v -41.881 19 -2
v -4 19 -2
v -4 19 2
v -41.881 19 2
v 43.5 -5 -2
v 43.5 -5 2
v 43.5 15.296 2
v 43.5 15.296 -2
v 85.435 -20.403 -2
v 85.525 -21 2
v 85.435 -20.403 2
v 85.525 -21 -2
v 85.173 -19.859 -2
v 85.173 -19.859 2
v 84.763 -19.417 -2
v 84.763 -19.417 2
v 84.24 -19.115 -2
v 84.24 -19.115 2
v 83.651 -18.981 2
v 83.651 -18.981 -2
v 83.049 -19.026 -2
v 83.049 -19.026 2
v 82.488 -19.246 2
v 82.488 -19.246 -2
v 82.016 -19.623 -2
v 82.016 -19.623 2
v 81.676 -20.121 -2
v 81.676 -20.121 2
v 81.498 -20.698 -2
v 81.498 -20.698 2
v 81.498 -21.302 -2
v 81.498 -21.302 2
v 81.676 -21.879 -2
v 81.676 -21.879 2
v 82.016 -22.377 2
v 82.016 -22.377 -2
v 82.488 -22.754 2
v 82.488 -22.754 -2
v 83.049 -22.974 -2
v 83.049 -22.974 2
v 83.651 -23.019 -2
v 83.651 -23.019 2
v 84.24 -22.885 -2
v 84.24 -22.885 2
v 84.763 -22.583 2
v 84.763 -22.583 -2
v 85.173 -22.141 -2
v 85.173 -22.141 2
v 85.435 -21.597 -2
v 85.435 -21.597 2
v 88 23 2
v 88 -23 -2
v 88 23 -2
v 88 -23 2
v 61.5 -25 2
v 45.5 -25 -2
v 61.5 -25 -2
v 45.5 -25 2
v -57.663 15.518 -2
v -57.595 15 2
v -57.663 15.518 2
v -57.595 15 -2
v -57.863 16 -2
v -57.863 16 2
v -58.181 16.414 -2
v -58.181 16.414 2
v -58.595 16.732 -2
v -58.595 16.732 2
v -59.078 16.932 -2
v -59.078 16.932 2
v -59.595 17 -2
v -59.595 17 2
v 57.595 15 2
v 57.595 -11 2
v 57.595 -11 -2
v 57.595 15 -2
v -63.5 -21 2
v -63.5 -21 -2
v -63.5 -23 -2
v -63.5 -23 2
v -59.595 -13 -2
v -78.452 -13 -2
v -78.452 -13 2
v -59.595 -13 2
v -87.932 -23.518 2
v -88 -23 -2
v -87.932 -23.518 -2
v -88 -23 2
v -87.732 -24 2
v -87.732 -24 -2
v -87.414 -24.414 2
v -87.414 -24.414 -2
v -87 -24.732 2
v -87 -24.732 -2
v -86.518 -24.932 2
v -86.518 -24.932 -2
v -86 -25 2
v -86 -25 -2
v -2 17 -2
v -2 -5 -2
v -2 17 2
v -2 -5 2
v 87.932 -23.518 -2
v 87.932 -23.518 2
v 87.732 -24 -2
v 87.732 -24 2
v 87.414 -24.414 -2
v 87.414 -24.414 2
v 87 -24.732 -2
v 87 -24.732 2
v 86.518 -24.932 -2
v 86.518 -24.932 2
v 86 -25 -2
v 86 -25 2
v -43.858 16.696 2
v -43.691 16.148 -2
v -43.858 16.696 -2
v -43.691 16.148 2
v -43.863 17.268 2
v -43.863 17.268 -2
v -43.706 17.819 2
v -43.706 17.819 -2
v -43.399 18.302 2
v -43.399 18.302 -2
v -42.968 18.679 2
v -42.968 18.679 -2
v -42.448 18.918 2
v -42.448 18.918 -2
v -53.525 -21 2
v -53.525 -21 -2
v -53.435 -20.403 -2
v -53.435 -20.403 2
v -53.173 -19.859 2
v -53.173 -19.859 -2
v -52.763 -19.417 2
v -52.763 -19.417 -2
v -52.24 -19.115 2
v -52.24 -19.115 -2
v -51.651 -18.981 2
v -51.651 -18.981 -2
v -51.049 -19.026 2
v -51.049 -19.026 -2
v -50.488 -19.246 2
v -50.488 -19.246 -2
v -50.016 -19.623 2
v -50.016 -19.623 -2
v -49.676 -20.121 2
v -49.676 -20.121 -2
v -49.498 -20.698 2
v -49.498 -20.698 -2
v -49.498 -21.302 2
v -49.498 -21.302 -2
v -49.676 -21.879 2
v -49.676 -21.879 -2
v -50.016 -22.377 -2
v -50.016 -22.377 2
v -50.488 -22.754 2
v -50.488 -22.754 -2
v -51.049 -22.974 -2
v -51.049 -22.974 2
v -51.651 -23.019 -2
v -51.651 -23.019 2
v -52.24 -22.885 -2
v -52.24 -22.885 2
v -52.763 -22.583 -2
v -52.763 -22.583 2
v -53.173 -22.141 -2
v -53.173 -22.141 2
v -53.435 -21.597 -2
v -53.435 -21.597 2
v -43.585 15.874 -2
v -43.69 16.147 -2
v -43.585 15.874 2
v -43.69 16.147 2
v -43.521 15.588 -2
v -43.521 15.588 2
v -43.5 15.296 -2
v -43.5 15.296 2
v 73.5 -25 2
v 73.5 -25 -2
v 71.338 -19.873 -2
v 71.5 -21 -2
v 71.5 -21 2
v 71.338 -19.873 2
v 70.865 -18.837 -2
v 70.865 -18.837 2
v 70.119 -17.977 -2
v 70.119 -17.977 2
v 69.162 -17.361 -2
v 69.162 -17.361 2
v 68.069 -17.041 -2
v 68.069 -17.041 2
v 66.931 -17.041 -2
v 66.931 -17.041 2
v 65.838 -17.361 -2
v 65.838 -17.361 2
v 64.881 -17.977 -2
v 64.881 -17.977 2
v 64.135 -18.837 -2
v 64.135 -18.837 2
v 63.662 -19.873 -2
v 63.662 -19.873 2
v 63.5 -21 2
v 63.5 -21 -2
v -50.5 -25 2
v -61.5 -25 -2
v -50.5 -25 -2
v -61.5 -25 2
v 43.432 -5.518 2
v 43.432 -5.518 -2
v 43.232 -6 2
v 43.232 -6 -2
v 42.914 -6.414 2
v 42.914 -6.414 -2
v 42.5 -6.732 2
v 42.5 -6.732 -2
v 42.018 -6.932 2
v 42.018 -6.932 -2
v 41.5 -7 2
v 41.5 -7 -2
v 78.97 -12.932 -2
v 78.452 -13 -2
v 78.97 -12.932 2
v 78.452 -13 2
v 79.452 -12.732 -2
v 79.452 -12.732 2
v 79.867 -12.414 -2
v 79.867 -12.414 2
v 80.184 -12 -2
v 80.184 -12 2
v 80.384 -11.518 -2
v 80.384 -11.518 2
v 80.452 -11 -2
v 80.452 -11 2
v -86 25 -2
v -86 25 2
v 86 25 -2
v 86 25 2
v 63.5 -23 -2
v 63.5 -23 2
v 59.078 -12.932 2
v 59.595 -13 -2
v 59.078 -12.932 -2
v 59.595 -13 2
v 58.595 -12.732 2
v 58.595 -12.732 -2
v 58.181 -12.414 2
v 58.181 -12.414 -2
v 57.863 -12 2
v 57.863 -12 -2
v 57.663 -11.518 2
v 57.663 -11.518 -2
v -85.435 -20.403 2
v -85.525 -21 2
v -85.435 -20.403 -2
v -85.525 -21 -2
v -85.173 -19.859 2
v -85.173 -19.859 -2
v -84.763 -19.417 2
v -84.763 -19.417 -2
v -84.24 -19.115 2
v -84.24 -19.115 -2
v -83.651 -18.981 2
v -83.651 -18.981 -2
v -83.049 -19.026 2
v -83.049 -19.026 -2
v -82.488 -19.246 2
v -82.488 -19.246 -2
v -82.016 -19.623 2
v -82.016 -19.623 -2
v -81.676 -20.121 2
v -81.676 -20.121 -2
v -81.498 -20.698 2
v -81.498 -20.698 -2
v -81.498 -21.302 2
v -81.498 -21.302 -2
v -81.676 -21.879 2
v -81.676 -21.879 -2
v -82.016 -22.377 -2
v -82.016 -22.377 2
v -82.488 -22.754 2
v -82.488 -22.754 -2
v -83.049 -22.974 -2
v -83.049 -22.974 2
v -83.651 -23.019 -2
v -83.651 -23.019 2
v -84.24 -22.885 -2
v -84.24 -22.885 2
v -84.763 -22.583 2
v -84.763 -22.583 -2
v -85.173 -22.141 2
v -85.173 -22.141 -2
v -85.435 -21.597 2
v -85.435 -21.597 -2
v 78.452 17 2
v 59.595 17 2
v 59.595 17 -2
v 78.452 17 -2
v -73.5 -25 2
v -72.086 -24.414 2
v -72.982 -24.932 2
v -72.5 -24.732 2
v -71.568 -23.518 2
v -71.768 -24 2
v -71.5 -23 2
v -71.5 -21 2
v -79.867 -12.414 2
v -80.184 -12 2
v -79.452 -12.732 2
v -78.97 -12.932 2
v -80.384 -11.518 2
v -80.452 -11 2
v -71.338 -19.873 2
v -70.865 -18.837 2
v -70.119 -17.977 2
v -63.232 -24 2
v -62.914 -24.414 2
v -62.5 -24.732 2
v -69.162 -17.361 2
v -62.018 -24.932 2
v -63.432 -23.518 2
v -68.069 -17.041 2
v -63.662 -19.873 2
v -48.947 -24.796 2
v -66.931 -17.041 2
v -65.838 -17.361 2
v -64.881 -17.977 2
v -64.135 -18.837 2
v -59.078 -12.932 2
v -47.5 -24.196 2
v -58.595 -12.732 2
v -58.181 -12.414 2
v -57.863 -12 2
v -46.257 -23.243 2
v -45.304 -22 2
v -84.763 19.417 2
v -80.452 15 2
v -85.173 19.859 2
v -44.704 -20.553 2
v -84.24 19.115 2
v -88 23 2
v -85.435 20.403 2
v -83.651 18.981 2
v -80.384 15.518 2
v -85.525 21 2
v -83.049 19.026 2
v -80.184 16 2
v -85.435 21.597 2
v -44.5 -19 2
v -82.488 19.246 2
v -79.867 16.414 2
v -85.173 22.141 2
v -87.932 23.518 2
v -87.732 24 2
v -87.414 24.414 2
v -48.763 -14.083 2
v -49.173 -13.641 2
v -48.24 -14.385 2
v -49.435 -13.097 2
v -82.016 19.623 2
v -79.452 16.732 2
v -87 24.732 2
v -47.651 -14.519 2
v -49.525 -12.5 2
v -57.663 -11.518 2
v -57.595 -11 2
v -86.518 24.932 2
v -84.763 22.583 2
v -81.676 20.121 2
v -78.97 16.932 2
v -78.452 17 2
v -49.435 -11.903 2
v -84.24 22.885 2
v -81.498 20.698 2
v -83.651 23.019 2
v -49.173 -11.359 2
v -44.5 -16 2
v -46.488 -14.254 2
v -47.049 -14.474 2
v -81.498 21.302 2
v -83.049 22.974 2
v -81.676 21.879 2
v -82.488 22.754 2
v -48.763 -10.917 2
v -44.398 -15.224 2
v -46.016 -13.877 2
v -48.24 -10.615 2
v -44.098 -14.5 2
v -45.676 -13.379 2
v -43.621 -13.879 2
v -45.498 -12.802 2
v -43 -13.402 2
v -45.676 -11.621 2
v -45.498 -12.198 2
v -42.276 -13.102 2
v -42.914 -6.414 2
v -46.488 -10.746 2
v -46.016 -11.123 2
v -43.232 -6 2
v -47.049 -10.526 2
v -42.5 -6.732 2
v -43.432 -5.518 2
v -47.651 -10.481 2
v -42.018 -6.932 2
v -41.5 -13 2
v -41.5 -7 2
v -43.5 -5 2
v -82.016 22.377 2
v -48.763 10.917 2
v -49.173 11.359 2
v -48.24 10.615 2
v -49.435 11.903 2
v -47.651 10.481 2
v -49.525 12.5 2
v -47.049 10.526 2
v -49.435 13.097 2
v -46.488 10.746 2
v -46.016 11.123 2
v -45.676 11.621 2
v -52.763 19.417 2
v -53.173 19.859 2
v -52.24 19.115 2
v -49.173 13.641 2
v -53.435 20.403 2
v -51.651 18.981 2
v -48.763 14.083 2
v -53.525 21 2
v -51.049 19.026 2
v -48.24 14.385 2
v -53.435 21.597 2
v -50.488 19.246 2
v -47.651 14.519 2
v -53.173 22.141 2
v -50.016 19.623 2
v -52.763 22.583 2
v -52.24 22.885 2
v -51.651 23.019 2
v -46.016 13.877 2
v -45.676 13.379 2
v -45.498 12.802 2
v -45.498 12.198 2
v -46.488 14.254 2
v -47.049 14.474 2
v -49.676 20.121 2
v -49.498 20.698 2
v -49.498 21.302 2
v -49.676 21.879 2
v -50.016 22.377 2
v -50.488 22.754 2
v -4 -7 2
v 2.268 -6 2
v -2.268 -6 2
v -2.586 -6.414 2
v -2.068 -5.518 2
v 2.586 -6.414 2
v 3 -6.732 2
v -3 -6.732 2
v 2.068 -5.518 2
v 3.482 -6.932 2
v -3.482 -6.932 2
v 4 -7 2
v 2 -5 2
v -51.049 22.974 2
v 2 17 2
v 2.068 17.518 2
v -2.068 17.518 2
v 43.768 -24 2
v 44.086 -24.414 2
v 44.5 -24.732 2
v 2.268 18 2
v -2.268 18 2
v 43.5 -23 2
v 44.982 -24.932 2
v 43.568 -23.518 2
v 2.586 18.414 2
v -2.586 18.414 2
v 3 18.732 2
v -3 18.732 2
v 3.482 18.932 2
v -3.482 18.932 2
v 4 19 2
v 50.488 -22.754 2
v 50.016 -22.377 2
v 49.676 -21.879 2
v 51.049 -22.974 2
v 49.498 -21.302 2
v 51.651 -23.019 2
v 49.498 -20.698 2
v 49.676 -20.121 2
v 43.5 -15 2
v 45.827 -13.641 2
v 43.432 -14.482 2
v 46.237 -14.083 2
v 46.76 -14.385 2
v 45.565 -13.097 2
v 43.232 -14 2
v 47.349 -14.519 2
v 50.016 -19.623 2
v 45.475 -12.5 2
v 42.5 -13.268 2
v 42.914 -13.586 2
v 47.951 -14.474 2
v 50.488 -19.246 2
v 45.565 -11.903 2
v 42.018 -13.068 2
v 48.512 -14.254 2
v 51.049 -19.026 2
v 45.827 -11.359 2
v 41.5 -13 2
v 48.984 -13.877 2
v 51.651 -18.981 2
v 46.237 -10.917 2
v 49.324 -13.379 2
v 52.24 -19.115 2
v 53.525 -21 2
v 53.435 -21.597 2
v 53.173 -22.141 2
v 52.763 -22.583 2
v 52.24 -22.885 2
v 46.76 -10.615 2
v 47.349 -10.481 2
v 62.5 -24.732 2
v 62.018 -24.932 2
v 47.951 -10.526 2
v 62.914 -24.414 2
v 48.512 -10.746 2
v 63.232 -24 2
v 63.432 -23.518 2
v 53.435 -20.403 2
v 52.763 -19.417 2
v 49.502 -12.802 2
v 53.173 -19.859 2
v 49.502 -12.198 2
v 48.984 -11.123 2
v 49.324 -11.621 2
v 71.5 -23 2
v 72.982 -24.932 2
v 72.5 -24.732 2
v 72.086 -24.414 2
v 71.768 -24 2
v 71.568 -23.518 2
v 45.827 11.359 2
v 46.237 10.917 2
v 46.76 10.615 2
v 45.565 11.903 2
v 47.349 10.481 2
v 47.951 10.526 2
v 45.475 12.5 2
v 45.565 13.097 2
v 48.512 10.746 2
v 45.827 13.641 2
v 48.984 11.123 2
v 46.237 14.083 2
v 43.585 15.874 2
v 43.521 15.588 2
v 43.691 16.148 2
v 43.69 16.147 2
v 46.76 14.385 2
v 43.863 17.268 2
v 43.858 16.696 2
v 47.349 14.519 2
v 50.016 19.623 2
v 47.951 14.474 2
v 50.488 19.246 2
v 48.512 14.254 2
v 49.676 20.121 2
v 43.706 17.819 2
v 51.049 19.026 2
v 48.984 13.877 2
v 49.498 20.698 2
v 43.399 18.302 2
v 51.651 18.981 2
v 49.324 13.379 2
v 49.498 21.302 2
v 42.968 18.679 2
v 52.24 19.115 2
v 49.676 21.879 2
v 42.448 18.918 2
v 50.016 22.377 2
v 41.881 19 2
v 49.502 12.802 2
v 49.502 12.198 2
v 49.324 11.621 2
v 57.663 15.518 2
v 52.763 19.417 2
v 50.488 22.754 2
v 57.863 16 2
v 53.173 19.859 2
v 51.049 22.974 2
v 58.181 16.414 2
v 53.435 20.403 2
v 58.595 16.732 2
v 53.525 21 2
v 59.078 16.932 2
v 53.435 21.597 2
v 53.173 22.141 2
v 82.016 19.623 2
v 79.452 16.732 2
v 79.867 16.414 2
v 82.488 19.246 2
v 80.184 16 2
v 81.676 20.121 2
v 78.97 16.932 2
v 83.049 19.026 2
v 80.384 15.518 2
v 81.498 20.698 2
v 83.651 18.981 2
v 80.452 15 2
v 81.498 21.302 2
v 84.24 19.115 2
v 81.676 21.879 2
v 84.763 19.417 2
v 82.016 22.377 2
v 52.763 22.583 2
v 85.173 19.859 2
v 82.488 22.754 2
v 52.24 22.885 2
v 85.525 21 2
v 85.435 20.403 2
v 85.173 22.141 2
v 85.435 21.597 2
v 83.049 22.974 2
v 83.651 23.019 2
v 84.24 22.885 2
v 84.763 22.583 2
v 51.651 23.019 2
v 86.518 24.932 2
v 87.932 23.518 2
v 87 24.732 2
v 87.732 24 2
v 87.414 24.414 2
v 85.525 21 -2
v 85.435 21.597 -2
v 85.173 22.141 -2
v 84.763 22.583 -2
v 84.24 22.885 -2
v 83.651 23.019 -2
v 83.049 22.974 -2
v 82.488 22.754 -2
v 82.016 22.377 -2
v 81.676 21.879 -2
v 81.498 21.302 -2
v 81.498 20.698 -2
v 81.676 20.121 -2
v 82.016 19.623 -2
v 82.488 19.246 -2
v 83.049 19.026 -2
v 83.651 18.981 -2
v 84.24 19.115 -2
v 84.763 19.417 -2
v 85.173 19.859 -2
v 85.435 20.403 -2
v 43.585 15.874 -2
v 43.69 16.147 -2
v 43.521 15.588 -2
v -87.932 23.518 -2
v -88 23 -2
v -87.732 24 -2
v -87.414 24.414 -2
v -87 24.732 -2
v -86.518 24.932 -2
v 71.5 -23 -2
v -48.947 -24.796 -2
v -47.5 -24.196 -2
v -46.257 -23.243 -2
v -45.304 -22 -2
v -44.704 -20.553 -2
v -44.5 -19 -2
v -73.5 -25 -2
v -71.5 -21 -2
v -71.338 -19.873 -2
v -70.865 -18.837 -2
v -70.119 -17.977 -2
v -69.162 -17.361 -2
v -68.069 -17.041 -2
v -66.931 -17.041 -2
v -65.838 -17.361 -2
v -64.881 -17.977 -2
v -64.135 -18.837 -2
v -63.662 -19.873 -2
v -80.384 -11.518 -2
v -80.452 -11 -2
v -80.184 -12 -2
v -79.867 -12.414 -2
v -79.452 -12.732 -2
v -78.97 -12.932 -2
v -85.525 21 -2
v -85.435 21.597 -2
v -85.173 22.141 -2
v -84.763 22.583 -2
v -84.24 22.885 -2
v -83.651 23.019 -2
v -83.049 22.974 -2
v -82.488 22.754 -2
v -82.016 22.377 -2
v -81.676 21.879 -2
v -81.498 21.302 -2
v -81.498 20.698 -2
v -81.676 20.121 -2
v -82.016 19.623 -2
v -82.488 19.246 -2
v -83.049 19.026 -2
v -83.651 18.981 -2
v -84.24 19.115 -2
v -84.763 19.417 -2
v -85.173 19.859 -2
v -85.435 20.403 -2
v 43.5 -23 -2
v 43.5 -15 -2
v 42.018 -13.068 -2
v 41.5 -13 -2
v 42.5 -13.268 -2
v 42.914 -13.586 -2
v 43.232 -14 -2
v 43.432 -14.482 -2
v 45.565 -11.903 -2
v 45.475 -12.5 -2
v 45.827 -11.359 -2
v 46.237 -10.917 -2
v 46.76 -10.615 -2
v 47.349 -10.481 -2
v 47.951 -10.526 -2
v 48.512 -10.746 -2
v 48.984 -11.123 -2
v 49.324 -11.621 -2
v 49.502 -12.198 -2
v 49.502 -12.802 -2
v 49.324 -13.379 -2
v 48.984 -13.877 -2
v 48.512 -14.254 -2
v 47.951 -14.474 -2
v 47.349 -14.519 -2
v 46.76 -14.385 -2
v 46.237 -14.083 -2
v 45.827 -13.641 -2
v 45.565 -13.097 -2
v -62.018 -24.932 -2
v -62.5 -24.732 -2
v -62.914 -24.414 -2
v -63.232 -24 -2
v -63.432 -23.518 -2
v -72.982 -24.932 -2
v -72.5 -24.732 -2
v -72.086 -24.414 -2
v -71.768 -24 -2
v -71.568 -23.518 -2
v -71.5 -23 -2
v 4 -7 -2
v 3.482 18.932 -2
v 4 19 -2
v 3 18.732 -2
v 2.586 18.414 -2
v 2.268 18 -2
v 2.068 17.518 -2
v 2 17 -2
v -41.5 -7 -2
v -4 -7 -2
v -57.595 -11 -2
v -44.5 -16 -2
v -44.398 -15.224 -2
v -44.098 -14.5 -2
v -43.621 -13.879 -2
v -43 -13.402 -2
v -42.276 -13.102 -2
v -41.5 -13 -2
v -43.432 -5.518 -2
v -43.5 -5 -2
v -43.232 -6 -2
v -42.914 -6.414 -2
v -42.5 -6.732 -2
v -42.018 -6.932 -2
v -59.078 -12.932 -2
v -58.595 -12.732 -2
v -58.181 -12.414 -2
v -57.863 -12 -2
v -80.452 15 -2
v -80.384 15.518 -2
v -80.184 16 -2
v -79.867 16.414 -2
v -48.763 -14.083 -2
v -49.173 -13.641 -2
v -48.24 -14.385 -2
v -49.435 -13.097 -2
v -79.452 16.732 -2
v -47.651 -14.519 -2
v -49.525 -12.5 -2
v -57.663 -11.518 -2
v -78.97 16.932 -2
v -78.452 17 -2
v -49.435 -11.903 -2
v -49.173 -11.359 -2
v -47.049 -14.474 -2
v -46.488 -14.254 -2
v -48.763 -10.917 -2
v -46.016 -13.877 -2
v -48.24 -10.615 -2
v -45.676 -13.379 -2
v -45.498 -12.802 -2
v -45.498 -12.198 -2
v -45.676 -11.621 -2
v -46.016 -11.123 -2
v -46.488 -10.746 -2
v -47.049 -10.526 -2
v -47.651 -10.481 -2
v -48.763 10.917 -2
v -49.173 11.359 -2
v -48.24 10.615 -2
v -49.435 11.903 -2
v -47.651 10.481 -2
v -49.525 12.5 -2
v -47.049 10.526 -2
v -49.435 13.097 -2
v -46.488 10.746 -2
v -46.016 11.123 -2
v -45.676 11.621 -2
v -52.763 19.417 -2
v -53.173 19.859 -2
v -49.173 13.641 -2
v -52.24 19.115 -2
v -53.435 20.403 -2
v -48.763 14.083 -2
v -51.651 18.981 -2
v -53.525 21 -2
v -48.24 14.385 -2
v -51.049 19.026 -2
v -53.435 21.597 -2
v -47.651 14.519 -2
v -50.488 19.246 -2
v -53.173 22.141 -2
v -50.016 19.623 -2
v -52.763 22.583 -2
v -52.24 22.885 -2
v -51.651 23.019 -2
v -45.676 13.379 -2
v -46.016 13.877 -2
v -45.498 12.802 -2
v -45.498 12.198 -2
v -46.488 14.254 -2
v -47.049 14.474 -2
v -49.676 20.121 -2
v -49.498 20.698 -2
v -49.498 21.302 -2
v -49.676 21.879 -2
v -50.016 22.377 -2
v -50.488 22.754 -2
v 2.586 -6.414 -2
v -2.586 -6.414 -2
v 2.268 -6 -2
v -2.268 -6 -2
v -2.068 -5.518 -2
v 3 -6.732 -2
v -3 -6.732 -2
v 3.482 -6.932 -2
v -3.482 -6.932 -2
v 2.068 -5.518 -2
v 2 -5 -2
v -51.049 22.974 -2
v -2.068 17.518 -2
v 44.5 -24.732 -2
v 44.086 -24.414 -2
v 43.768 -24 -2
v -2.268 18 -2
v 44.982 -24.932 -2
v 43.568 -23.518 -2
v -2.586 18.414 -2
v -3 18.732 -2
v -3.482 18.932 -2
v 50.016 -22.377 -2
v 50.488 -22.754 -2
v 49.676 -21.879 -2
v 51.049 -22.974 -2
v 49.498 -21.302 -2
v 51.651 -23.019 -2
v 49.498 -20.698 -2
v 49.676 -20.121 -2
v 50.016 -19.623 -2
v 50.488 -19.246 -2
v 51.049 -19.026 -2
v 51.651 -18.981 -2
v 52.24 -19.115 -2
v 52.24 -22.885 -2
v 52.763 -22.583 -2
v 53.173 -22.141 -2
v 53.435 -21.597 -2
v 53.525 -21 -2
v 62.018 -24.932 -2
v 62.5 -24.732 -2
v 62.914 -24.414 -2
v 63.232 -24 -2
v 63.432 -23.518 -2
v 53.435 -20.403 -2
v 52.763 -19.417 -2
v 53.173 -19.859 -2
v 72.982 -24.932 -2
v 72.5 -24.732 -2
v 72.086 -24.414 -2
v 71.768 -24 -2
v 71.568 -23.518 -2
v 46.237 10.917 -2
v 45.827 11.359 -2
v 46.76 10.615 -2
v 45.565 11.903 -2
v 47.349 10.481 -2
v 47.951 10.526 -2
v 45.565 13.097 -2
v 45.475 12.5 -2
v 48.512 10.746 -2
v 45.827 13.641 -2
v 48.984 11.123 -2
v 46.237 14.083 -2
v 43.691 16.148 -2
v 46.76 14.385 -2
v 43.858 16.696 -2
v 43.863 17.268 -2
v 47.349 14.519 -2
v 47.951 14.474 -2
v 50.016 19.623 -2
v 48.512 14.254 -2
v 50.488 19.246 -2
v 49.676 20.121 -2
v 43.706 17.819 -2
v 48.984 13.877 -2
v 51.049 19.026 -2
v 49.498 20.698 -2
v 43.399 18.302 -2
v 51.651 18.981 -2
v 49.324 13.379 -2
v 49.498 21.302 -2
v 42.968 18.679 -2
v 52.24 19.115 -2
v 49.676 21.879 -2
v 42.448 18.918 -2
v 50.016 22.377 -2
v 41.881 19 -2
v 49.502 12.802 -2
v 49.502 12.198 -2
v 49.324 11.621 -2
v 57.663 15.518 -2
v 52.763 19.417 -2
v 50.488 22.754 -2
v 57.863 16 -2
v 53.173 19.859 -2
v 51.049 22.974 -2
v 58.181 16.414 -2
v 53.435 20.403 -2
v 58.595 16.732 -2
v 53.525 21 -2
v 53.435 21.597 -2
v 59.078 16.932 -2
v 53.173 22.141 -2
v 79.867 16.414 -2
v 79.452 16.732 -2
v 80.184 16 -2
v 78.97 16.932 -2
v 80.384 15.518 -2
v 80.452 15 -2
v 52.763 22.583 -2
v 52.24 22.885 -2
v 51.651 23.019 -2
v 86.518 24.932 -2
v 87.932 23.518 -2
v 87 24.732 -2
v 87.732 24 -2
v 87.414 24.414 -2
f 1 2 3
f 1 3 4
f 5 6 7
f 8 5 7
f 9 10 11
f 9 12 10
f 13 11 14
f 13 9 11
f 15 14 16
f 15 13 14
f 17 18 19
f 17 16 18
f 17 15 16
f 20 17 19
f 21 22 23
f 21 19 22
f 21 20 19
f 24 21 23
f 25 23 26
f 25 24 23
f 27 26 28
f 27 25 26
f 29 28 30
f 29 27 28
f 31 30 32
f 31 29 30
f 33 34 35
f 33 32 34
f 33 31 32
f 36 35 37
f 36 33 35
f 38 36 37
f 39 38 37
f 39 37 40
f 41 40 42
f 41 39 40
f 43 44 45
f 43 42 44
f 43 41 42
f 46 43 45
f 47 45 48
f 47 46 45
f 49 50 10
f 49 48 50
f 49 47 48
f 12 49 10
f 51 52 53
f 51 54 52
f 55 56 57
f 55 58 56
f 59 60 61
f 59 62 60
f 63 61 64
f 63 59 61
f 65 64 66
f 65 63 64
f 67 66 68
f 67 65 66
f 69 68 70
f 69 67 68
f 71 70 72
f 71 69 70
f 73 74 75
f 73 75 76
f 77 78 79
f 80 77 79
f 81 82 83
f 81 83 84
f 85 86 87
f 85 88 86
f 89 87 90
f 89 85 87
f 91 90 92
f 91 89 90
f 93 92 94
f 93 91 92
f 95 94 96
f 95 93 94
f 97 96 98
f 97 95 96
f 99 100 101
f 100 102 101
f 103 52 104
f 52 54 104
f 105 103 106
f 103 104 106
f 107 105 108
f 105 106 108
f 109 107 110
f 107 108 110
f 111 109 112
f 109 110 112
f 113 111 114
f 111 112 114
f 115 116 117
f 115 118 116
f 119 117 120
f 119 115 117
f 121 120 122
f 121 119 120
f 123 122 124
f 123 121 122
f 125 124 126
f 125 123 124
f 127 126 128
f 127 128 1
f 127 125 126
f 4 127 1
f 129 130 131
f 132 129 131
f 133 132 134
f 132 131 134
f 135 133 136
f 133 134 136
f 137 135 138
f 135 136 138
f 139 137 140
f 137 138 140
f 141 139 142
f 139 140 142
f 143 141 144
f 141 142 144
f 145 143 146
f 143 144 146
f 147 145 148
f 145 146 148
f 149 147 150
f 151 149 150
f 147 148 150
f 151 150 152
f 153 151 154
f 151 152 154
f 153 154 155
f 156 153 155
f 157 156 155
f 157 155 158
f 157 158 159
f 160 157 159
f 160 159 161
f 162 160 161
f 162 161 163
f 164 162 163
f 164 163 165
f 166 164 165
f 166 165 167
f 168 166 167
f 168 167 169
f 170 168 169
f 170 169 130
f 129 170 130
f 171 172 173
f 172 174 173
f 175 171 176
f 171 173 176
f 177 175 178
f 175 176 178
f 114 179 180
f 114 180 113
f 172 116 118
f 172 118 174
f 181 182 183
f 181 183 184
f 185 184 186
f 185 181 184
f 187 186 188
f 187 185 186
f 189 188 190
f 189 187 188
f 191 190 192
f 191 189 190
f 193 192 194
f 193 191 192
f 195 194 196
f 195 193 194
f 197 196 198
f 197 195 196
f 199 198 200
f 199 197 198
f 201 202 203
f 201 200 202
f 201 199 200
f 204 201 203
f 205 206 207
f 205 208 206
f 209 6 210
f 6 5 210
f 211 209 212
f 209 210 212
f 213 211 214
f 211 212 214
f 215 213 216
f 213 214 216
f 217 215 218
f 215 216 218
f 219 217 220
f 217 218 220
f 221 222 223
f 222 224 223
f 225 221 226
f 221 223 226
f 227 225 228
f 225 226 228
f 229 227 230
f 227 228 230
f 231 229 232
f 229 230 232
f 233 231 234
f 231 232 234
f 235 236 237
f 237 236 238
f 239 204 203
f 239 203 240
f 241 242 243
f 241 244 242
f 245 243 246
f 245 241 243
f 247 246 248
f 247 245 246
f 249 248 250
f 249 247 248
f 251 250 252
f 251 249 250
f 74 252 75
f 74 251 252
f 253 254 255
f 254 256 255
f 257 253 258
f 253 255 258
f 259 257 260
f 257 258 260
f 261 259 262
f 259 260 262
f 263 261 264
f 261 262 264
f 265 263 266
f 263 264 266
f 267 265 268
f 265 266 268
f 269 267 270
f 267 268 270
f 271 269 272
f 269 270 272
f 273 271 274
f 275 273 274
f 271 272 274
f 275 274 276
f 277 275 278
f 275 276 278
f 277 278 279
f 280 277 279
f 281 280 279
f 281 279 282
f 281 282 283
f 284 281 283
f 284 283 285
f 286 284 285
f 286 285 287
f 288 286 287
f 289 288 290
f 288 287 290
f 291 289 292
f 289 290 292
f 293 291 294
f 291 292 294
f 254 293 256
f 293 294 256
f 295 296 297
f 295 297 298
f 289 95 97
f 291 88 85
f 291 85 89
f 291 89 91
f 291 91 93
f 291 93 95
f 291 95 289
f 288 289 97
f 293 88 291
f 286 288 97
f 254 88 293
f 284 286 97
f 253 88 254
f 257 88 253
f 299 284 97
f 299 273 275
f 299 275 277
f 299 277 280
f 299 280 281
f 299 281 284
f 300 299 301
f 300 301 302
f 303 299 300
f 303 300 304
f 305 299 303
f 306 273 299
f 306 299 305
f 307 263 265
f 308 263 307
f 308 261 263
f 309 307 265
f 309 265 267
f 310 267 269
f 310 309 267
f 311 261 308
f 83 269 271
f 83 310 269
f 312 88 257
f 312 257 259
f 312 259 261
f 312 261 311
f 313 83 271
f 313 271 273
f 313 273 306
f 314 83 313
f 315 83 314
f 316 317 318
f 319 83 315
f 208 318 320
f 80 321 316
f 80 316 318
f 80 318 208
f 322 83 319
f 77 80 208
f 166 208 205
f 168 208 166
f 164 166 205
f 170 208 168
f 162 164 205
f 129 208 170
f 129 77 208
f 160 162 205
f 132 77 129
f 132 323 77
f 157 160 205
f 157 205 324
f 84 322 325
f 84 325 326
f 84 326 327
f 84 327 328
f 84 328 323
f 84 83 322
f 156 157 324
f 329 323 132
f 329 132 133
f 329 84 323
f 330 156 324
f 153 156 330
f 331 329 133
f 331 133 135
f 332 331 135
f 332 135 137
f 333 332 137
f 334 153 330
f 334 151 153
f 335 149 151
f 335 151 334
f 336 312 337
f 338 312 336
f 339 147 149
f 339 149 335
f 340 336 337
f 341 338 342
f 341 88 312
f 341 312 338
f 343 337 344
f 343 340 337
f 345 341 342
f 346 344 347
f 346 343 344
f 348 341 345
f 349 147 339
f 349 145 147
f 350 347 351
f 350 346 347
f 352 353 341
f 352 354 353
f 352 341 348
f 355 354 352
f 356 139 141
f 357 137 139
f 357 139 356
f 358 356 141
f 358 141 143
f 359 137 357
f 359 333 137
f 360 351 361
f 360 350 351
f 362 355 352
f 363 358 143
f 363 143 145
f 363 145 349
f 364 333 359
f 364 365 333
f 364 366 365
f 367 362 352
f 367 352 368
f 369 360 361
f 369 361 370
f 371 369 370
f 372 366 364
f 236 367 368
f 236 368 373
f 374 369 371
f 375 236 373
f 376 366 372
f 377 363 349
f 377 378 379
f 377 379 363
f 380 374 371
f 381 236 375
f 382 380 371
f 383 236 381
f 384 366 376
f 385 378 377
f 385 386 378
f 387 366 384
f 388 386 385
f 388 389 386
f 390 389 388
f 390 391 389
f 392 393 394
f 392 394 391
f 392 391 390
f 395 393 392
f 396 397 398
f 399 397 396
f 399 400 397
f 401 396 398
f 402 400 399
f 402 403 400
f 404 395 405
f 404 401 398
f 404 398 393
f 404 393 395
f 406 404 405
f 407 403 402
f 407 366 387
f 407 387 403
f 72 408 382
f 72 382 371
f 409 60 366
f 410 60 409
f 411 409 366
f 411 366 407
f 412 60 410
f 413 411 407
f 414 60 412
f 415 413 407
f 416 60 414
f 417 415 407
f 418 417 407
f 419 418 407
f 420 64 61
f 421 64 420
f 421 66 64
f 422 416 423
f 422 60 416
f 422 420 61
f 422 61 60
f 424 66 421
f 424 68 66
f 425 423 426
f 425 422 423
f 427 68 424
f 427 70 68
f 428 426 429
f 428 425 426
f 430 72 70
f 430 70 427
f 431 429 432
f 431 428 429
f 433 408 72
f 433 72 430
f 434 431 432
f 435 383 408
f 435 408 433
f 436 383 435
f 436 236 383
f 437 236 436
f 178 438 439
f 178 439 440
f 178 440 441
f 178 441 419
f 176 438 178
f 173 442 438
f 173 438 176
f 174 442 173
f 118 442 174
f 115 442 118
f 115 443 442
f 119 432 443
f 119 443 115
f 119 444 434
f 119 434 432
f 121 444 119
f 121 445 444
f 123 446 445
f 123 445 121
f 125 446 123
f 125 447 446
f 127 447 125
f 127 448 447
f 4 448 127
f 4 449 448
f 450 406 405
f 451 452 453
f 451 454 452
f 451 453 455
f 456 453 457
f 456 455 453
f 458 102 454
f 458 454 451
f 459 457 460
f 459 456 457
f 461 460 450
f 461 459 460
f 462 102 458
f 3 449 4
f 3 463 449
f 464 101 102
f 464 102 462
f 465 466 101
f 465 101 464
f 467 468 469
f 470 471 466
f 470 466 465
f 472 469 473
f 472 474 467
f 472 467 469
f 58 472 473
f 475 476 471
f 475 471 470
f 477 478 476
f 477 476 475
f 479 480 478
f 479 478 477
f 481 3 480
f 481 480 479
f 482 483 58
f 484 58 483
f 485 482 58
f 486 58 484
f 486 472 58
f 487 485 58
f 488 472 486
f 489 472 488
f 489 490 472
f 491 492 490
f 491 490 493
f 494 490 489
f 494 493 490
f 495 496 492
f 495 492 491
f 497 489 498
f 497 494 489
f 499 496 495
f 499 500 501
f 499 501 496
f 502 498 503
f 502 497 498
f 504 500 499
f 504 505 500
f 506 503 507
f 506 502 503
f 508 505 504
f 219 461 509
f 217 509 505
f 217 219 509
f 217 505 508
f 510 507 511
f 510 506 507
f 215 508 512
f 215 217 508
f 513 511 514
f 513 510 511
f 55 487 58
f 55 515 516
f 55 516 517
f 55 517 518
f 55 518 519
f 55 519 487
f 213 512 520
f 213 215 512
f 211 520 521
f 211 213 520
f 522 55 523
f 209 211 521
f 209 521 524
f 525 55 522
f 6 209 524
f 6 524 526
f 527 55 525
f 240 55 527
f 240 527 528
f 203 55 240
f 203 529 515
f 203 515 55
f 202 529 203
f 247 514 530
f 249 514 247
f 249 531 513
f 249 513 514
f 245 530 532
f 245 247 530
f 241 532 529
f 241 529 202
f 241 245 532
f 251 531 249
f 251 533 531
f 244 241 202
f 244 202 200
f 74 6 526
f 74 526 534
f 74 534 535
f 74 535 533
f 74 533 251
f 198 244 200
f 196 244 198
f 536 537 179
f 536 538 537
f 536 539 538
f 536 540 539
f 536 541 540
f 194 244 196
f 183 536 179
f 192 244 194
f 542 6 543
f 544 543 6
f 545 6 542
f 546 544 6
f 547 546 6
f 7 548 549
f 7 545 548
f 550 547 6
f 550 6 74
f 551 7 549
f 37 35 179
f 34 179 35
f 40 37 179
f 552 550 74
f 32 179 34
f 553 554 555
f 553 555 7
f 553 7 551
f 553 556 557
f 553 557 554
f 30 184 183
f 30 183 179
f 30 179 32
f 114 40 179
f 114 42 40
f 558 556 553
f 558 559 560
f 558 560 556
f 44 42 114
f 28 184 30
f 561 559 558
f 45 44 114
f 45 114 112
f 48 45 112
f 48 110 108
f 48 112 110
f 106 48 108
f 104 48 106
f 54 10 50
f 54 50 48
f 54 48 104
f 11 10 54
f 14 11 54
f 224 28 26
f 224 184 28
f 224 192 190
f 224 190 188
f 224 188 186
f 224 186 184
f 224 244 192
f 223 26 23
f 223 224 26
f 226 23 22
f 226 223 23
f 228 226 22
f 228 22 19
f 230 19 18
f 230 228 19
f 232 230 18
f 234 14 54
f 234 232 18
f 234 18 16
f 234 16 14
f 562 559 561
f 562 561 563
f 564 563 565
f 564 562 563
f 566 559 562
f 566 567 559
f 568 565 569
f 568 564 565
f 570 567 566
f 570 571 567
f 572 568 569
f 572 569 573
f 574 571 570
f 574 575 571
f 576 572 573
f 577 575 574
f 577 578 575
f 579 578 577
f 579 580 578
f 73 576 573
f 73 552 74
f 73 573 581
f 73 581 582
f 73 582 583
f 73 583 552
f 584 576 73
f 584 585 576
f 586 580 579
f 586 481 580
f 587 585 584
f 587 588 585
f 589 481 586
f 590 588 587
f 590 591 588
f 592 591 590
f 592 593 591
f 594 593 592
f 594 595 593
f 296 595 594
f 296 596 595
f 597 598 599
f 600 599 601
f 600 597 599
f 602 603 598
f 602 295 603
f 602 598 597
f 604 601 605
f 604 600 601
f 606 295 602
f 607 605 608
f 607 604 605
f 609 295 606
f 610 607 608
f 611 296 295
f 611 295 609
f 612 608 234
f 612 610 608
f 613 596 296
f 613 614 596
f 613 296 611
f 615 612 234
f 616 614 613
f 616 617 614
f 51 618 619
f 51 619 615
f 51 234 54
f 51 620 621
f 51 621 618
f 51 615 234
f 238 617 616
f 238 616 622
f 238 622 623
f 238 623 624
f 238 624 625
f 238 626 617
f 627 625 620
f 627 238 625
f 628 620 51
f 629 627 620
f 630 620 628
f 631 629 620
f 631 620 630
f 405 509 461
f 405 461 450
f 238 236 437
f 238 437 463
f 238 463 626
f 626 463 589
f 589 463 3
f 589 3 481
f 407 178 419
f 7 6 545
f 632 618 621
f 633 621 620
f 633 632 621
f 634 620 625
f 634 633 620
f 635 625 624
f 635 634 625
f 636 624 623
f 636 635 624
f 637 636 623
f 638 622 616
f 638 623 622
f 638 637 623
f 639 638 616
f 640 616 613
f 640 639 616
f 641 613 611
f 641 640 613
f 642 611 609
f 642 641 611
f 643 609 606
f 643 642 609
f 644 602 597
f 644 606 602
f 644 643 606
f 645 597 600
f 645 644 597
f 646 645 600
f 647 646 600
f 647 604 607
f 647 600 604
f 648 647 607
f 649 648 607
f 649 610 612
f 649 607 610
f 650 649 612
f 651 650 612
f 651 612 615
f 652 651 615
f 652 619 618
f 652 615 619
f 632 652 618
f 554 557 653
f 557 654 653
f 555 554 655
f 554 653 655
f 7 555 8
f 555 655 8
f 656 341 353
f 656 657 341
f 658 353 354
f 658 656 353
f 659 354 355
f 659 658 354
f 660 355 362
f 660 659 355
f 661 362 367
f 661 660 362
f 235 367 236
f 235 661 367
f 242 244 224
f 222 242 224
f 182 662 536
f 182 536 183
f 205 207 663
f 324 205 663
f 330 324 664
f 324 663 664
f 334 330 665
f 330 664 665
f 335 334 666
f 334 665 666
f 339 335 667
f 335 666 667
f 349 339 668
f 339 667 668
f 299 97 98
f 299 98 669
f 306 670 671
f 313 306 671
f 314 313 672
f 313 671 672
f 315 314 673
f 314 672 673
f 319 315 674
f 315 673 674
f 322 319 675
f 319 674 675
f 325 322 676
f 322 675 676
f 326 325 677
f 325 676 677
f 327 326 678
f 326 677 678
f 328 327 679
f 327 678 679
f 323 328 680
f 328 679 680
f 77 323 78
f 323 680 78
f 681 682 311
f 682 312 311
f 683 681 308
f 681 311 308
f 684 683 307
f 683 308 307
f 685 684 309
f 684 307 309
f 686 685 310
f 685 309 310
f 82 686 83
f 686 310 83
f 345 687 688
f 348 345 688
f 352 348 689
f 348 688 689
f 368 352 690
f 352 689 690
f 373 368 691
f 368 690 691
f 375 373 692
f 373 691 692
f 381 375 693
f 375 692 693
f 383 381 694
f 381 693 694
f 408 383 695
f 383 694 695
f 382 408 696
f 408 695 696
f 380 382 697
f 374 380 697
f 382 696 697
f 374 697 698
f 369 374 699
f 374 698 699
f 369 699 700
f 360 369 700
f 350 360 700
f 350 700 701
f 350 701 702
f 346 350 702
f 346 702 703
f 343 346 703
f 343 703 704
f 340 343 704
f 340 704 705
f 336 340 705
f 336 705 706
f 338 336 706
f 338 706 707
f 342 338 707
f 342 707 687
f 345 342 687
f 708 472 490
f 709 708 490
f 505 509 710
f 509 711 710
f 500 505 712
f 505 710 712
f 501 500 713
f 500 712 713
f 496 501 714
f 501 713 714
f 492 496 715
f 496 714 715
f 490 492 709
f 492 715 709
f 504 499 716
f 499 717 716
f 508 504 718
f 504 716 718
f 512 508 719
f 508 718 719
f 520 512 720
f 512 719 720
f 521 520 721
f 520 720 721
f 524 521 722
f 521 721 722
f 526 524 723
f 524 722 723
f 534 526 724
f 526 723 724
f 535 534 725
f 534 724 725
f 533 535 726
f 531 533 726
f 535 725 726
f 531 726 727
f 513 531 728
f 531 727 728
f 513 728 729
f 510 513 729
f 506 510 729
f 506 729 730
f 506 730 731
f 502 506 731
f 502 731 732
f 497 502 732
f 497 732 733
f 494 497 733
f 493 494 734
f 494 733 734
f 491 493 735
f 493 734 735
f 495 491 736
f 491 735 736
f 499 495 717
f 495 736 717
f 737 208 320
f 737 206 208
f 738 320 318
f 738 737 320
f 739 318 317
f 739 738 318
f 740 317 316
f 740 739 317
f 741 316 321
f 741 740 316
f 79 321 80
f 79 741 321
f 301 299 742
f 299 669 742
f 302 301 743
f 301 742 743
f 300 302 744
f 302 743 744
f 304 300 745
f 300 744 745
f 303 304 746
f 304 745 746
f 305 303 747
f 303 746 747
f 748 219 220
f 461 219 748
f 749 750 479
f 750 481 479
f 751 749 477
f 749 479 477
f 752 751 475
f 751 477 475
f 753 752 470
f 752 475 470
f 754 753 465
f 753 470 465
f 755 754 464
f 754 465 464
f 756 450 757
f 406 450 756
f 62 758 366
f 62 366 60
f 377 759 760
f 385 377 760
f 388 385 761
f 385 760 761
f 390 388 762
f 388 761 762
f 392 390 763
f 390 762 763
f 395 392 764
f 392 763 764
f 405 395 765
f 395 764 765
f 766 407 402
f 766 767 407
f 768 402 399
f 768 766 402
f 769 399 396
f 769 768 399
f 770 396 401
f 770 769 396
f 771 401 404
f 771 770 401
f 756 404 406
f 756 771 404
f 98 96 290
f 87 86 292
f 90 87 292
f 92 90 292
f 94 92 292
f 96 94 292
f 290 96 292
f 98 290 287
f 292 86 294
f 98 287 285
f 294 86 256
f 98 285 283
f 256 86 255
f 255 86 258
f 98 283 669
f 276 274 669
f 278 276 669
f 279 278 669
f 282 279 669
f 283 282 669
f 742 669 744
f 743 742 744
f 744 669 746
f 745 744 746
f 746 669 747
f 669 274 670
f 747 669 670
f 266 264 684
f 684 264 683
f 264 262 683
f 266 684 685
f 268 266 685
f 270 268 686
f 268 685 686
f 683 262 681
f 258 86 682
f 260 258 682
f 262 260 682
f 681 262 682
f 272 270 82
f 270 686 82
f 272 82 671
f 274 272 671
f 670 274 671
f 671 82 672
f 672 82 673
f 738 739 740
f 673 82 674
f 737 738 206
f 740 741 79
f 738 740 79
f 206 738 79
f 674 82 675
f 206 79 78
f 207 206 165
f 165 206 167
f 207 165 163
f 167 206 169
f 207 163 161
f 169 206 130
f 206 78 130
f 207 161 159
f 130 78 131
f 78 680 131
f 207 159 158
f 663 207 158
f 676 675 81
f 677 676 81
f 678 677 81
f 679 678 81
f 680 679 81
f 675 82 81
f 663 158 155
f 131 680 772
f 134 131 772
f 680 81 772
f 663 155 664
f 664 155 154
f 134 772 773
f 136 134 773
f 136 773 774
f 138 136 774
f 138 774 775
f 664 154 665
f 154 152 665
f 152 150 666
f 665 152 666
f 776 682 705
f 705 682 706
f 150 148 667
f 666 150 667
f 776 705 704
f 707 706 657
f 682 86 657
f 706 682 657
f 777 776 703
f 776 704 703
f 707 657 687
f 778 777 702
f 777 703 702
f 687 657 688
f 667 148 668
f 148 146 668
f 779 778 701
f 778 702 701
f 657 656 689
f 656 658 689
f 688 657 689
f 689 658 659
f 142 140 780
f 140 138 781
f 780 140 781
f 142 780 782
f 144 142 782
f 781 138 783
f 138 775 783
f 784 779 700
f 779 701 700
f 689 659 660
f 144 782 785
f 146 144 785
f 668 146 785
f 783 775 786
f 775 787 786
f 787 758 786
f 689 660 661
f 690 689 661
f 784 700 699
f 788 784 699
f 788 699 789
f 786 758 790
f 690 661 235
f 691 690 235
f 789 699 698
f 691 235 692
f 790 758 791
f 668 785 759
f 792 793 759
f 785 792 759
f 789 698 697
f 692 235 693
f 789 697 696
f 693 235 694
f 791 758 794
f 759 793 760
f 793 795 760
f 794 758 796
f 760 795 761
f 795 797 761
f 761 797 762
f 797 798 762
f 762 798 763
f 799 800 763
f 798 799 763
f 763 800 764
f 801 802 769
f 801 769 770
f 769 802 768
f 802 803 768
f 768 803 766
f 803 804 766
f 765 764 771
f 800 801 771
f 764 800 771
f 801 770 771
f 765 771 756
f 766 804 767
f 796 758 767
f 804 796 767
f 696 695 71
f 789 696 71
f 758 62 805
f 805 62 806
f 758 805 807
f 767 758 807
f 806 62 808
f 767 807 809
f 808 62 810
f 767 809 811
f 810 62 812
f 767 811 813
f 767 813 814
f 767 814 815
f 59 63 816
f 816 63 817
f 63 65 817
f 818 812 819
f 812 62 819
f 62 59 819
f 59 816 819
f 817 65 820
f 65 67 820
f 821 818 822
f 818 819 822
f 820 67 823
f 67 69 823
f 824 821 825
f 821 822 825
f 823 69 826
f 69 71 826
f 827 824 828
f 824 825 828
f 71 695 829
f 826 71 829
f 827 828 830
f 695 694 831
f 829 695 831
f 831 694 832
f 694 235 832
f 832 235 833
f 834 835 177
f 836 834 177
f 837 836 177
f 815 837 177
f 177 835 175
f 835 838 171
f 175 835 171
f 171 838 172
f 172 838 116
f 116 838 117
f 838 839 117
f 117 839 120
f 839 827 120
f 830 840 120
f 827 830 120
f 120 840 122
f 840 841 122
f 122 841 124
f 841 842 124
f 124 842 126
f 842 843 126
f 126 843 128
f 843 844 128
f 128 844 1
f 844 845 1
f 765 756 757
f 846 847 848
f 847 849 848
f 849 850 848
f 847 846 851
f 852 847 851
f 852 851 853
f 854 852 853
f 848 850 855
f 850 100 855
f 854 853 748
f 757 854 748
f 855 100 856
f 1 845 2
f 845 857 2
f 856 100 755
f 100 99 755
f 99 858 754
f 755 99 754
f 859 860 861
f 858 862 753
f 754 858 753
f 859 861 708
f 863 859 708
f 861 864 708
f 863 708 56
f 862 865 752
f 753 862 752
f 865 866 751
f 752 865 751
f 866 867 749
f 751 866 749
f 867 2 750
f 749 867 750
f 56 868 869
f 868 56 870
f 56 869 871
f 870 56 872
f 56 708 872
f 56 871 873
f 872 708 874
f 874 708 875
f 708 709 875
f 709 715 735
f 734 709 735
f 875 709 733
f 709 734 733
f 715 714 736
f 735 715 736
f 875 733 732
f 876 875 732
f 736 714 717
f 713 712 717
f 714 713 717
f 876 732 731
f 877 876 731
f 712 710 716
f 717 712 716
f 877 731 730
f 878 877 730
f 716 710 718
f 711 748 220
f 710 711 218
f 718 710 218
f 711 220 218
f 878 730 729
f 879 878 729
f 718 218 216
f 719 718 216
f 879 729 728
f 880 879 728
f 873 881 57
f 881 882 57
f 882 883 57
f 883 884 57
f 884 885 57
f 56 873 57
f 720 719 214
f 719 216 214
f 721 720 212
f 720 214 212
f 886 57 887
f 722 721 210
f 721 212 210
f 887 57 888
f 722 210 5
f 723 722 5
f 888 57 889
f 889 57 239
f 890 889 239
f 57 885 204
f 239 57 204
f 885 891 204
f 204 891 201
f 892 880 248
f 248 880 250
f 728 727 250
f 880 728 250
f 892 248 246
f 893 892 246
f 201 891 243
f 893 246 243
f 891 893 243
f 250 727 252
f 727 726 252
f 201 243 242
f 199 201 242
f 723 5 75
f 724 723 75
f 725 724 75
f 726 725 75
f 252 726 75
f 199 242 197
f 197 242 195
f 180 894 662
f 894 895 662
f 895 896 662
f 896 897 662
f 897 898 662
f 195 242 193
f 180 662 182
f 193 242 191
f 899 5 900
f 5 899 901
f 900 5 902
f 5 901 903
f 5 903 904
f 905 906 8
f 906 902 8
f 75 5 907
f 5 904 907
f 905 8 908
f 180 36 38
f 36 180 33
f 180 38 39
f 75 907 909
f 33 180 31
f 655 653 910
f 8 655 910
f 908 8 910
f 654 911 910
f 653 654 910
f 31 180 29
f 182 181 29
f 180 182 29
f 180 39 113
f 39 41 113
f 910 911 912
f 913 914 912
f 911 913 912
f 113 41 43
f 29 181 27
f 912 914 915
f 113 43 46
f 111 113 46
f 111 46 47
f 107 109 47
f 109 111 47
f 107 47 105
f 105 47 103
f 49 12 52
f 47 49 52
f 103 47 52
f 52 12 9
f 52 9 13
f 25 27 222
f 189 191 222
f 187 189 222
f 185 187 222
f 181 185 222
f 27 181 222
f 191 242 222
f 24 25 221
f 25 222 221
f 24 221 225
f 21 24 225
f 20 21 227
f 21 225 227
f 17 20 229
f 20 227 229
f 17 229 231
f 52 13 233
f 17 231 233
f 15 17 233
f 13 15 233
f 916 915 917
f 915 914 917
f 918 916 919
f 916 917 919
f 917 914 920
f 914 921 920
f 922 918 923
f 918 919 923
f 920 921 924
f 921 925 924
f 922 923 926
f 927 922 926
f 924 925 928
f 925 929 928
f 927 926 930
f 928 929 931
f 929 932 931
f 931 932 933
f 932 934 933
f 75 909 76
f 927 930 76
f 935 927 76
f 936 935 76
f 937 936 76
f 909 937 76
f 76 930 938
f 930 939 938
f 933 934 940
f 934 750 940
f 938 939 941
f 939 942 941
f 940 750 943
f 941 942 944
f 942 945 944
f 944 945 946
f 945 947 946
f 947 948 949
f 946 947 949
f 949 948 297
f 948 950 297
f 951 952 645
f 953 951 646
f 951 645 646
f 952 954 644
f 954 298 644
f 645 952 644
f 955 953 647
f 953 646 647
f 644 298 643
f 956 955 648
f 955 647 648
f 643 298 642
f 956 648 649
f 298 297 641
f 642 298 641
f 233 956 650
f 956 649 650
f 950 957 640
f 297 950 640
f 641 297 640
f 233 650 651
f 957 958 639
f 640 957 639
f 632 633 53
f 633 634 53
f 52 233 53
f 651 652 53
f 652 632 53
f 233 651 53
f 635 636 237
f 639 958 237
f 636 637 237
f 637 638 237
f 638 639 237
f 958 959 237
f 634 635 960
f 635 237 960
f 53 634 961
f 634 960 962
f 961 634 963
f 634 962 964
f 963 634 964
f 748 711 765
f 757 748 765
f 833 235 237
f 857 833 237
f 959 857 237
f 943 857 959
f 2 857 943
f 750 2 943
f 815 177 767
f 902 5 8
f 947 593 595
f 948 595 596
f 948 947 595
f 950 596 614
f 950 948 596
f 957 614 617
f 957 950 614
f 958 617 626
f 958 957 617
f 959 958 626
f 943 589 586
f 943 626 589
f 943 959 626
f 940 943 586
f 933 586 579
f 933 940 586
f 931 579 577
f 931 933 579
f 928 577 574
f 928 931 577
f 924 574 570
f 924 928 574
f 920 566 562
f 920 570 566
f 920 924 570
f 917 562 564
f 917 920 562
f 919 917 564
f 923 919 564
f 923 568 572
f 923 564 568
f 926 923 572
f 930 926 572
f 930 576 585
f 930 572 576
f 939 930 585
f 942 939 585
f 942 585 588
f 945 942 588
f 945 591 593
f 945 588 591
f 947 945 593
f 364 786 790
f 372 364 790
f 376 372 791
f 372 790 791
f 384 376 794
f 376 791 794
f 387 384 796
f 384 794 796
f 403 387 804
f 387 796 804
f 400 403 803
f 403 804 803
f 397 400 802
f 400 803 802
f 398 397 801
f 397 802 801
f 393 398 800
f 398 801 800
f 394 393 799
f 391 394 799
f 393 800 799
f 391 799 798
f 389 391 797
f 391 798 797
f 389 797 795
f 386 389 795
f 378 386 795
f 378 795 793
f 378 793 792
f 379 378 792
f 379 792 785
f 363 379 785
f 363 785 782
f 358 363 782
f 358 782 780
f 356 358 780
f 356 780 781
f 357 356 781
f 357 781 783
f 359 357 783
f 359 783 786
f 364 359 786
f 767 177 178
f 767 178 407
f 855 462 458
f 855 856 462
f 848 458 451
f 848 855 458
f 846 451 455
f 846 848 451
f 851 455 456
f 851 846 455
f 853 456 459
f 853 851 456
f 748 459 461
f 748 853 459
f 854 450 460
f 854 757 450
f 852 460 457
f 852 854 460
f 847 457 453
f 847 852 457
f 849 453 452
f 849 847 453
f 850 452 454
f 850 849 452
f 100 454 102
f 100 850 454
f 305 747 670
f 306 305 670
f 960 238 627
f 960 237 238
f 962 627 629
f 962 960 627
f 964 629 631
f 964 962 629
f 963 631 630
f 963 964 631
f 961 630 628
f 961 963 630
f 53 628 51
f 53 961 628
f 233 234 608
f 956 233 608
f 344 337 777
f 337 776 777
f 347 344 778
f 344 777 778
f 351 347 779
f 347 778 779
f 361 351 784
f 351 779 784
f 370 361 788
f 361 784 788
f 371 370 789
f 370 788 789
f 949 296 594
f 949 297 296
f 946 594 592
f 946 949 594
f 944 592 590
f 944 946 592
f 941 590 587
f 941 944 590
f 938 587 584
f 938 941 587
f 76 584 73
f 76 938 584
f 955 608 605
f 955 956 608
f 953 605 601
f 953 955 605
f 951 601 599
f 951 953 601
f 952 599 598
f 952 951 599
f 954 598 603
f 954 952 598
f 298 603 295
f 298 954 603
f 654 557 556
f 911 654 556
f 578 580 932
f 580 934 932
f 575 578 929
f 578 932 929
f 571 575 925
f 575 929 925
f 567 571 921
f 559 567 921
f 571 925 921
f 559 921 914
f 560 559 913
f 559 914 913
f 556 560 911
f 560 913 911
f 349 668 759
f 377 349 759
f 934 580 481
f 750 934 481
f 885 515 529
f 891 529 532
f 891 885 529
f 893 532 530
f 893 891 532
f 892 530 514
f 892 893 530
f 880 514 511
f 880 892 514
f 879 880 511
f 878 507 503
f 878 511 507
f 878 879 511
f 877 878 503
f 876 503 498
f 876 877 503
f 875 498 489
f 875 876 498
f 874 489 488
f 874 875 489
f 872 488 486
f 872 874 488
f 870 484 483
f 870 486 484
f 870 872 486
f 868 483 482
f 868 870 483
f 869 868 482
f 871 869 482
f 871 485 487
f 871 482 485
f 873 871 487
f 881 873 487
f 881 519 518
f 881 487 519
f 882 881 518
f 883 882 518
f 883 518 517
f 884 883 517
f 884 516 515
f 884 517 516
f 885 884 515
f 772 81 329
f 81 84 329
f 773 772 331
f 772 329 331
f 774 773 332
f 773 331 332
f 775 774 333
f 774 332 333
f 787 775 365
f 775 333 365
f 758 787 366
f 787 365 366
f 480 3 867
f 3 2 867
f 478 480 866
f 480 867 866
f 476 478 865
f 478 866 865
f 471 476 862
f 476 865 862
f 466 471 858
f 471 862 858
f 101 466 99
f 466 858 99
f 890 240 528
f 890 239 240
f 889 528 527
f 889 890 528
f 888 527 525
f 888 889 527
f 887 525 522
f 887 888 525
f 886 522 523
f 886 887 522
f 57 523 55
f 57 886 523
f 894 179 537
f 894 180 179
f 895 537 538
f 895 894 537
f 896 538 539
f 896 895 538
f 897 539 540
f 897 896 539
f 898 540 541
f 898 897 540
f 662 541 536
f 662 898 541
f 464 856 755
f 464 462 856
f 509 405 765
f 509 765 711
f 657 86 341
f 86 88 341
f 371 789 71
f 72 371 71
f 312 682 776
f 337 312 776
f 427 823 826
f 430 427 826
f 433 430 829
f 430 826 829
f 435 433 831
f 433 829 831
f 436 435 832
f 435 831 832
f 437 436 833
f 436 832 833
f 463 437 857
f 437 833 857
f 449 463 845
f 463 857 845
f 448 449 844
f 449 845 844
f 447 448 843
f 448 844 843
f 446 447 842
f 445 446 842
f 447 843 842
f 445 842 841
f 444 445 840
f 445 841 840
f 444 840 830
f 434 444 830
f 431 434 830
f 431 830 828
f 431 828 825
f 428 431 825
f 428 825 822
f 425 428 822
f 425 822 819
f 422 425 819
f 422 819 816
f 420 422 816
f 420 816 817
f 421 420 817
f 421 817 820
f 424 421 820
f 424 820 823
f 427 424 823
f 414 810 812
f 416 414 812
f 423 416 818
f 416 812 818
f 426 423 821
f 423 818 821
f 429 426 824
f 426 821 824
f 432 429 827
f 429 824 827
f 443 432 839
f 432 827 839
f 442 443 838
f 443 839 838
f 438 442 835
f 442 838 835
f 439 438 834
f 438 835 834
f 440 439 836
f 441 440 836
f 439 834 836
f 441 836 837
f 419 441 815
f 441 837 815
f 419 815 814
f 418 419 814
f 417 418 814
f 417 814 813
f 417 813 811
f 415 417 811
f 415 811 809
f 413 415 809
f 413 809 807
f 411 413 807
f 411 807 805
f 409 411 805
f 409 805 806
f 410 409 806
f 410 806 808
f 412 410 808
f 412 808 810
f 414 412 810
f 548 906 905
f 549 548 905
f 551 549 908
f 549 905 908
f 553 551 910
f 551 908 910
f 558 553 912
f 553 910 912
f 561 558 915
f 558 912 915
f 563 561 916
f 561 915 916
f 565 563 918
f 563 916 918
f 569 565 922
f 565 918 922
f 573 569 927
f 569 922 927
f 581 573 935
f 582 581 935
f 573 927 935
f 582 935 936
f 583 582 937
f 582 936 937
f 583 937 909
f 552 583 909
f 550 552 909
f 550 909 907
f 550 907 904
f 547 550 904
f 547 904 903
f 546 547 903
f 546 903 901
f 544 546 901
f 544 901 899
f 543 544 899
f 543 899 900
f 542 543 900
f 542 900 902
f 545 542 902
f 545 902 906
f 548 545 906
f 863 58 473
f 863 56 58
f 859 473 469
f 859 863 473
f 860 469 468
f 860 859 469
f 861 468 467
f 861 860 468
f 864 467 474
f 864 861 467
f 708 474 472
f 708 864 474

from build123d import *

# Parameters (mm, degrees)
SKETCH_1_W           = 176
SKETCH_1_H           = 50
EXTRUDE_1_DEPTH      = 2
SKETCH_2_R           = 2.025
CUT_EXTRUDE_1_DEPTH  = 22
CUT_EXTRUDE_2_DEPTH  = 17
FILLET_1_R           = 2
SKETCH_4_R           = 2.025
CUT_EXTRUDE_3_DEPTH  = 5
CUT_EXTRUDE_5_DEPTH  = 15.5
SKETCH_8_W           = 22.857142857
SKETCH_8_H           = 30
CUT_EXTRUDE_6_DEPTH  = 15.5
FILLET_2_R           = 2
SKETCH_22_W          = 54
SKETCH_22_H          = 23
CUT_EXTRUDE_14_DEPTH = 10
EXTRUDE_8_DEPTH      = 4
CHAMFER_1_SIZE       = 10
CHAMFER_2_SIZE       = 10
FILLET_9_R           = 2
SKETCH_24_W          = 87
SKETCH_24_H          = 30
CUT_EXTRUDE_15_DEPTH = 10
SKETCH_25_W          = 4
SKETCH_25_H          = 12
EXTRUDE_9_DEPTH      = 4
FILLET_10_R          = 2
CUT_EXTRUDE_16_DEPTH = 10


with BuildPart() as part:
    # 草图1 → 凸台-拉伸1 (new, symmetric)
    with BuildSketch(Plane.XY):
        Rectangle(SKETCH_1_W, SKETCH_1_H)
    extrude(amount=EXTRUDE_1_DEPTH, both=True)

    # 草图2 → 切除-拉伸1 (cut, symmetric)
    with BuildSketch(Plane(origin=(0, 0, -2), x_dir=(-1, 0, 0), z_dir=(0, 0, -1))):
        with Locations((51.5, 21)):
            Circle(SKETCH_2_R)
        with Locations((51.5, -21)):
            Circle(SKETCH_2_R)
        with Locations((83.5, 21)):
            Circle(SKETCH_2_R)
        with Locations((83.5, -21)):
            Circle(SKETCH_2_R)
    cut_extrude_1 = extrude(amount=CUT_EXTRUDE_1_DEPTH, both=True, mode=Mode.SUBTRACT)

    # 镜向1: 切除-拉伸1 across plane
    add(cut_extrude_1.mirror(Plane(origin=(0, 0, 0), x_dir=(0, 0, 1), z_dir=(1, 0, 0))), mode=Mode.SUBTRACT)

    # 草图3 → 切除-拉伸2 (cut, symmetric)
    with BuildSketch(Plane(origin=(0, 0, -2), x_dir=(-1, 0, 0), z_dir=(0, 0, -1))):
        with BuildLine():
            Line((63.5, -21), (63.5, -25))
            Line((63.5, -25), (71.5, -25))
            Line((71.5, -25), (71.5, -21))
            ThreePointArc((71.5, -21), (67.5, -17), (63.5, -21))
        make_face()
    cut_extrude_2 = extrude(amount=CUT_EXTRUDE_2_DEPTH, both=True, mode=Mode.SUBTRACT)

    # 镜向2: 切除-拉伸2 across plane
    add(cut_extrude_2.mirror(Plane(origin=(0, 0, 0), x_dir=(0, 0, 1), z_dir=(1, 0, 0))), mode=Mode.SUBTRACT)

    # 圆角1
    fillet_1_edges = [part.edges().sort_by_distance(p)[0] for p in [
        (-71.5, -25, 0),
        (-63.5, -25, 0),
        (88, -25, 0),
        (-88, -25, 0),
        (-88, 25, 0),
        (88, 25, 0),
        (63.5, -25, 0),
        (71.5, -25, 0),
    ]]
    fillet(fillet_1_edges, radius=FILLET_1_R)

    # 草图4 → 切除-拉伸3 (cut, symmetric)
    with BuildSketch(Plane(origin=(0, 0, -2), x_dir=(-1, 0, 0), z_dir=(0, 0, -1))):
        with Locations((47.5, -12.5)):
            Circle(SKETCH_4_R)
        with Locations((47.5, 12.5)):
            Circle(SKETCH_4_R)
        with Locations((-47.5, 12.5)):
            Circle(SKETCH_4_R)
        with Locations((-47.5, -12.5)):
            Circle(SKETCH_4_R)
    extrude(amount=CUT_EXTRUDE_3_DEPTH, both=True, mode=Mode.SUBTRACT)

    # 草图7 → 切除-拉伸5 (cut, symmetric)
    with BuildSketch(Plane.XY.offset(2)):
        Polygon((-2, 19), (-45.032854639, 19), (-43.5, 15.742683893), (-43.5, -15.742683893), (-45.032854639, -19), (-2, -19), align=None)
        Polygon((45.032854639, 19), (2, 19), (2, -19), (45.032854639, -19), (43.5, -15.742683893), (43.5, 15.742683893), align=None)
    extrude(amount=CUT_EXTRUDE_5_DEPTH, both=True, mode=Mode.SUBTRACT)

    # 草图8 → 切除-拉伸6 (cut, symmetric)
    with BuildSketch(Plane.XY.offset(2)):
        with Locations((-69.023809524, 2)):
            Rectangle(SKETCH_8_W, SKETCH_8_H)
        with Locations((69.023809524, 2)):
            Rectangle(SKETCH_8_W, SKETCH_8_H)
    extrude(amount=CUT_EXTRUDE_6_DEPTH, both=True, mode=Mode.SUBTRACT)

    # 圆角2
    fillet_2_edges = [part.edges().sort_by_distance(p)[0] for p in [
        (-2, 19, 0),
        (-2, -19, 0),
        (-45.032854639, -19, 0),
        (-43.5, -15.742683893, 0),
        (-43.5, 15.742683893, 0),
        (-45.032854639, 19, 0),
        (2, 19, 0),
        (45.032854639, 19, 0),
        (43.5, 15.742683893, 0),
        (43.5, -15.742683893, 0),
        (45.032854639, -19, 0),
        (2, -19, 0),
        (-80.452380952, -13, 0),
        (-80.452380952, 17, 0),
        (-57.595238095, 17, 0),
        (-57.595238095, -13, 0),
        (80.452380952, 17, 0),
        (80.452380952, -13, 0),
        (57.595238095, -13, 0),
        (57.595238095, 17, 0),
    ]]
    fillet(fillet_2_edges, radius=FILLET_2_R)

    # 草图22 → 切除-拉伸14 (cut)
    with BuildSketch(Plane(origin=(0, 0, -2), x_dir=(-1, 0, 0), z_dir=(0, 0, -1))):
        with Locations((0, -13.5)):
            Rectangle(SKETCH_22_W, SKETCH_22_H)
    extrude(amount=-CUT_EXTRUDE_14_DEPTH, mode=Mode.SUBTRACT)

    # 草图23 → 凸台-拉伸8 (add)
    with BuildSketch(Plane(origin=(0, 0, -2), x_dir=(-1, 0, 0), z_dir=(0, 0, -1))):
        Polygon((-31, -25), (-27, -25), (-27, -2), (27, -2), (27, -25), (31, -25), (31, 2), (-31, 2), align=None)
    extrude(amount=-EXTRUDE_8_DEPTH)

    # 倒角1
    chamfer_1_edges = [part.edges().sort_by_distance(p)[0] for p in [
        (27, -2, 0),
        (-27, -2, 0),
    ]]
    chamfer(chamfer_1_edges, length=CHAMFER_1_SIZE)

    # 倒角2
    chamfer_2_edges = [part.edges().sort_by_distance(p)[0] for p in [
        (31, 2, 0),
        (-31, 2, 0),
    ]]
    chamfer(chamfer_2_edges, length=CHAMFER_2_SIZE)

    # 圆角9
    fillet_9_edges = [part.edges().sort_by_distance(p)[0] for p in [
        (-27, -25, 0),
        (27, -25, 0),
        (-31, -19, 0),
        (-2, 2, 0),
        (31, -19, 0),
        (2, 2, 0),
        (21, 2, 0),
        (31, -8, 0),
        (-31, -8, 0),
        (-21, 2, 0),
    ]]
    fillet(fillet_9_edges, radius=FILLET_9_R)

    # 草图24 → 切除-拉伸15 (cut)
    with BuildSketch(Plane.XY.offset(2)):
        with Locations((0, -10)):
            Rectangle(SKETCH_24_W, SKETCH_24_H)
    extrude(amount=-CUT_EXTRUDE_15_DEPTH, mode=Mode.SUBTRACT)

    # 草图25 → 凸台-拉伸9 (add)
    with BuildSketch(Plane.XY.offset(2)):
        Polygon((2, -7), (-2, -7), (-43.5, -7), (-43.5, -13), (43.5, -13), (43.5, -7), align=None)
        with Locations((0, -1)):
            Rectangle(SKETCH_25_W, SKETCH_25_H)
        with BuildLine():
            Line((-43.5, -18.174640335), (-43.5, -15.295610336))
            ThreePointArc((-43.5, -15.295610336), (-43.548170754, -15.731915957), (-43.690362596, -16.147204408))
            Line((-43.690362596, -16.147204408), (-43.690928016, -16.148405927))
            ThreePointArc((-43.690928016, -16.148405927), (-43.872470388, -17.187624889), (-43.5, -18.174640335))
        make_face()
        with BuildLine():
            ThreePointArc((43.690362596, -16.147204408), (43.548170754, -15.731915957), (43.5, -15.295610336))
            Line((43.5, -15.295610336), (43.5, -18.174640335))
            ThreePointArc((43.5, -18.174640335), (43.872470388, -17.187624889), (43.690928016, -16.148405927))
            Line((43.690928016, -16.148405927), (43.690362596, -16.147204408))
        make_face()
    extrude(amount=-EXTRUDE_9_DEPTH)

    # 圆角10
    fillet_10_edges = [part.edges().sort_by_distance(p)[0] for p in [
        (-43.5, -25, 0),
        (43.5, -25, 0),
        (43.5, -7, 0),
        (43.5, -13, 0),
        (-43.5, -13, 0),
        (-43.5, -7, 0),
        (-2, -7, 0),
        (2, -7, 0),
    ]]
    fillet(fillet_10_edges, radius=FILLET_10_R)

    # 草图26 → 切除-拉伸16 (cut)
    with BuildSketch(Plane(origin=(0, 0, -2), x_dir=(-1, 0, 0), z_dir=(0, 0, -1))):
        with BuildLine():
            Line((44.5, -19), (44.5, -16))
            ThreePointArc((44.5, -16), (43.621320344, -13.878679656), (41.5, -13))
            ThreePointArc((41.5, -13), (42.914213562, -13.585786438), (43.5, -15))
            Line((43.5, -15), (43.5, -23))
            ThreePointArc((43.5, -23), (44.085786438, -24.414213562), (45.5, -25))
            Line((45.5, -25), (50.5, -25))
            ThreePointArc((50.5, -25), (46.257359313, -23.242640687), (44.5, -19))
        make_face()
    extrude(amount=-CUT_EXTRUDE_16_DEPTH, mode=Mode.SUBTRACT)


solid = part.part
